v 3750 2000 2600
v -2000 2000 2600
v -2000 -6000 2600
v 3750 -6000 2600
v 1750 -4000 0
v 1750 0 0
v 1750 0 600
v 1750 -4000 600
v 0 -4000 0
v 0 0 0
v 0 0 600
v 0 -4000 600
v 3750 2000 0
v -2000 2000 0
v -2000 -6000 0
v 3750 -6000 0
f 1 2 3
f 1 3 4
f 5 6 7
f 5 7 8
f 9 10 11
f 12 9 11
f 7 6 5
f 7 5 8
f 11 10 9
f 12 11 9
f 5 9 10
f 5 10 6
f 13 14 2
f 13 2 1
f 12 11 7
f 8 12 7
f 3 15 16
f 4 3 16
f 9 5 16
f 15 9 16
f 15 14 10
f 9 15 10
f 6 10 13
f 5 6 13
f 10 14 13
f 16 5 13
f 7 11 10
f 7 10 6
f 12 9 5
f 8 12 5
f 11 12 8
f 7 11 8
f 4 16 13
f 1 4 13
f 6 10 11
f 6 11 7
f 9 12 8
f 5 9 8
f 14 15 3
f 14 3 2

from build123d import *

# Parameters (mm, degrees)
F0_W     = 1750
F0_H     = 600
F1_DEPTH = 4000
F2_W     = 5750
F2_H     = 8000
F3_DEPTH = 2600
F5_W     = 1750
F5_H     = 4000
F6_DEPTH = 600


with BuildPart() as f1:
    # F0 (on Front) → F1 (new body)
    with BuildSketch(Plane.XZ):
        with Locations((875, 300)):
            Rectangle(F0_W, F0_H)
    extrude(amount=F1_DEPTH)


with BuildPart() as f3:
    # F2 (on Top) → F3 (new body)
    with BuildSketch(Plane.XY):
        with Locations((875, -2000)):
            Rectangle(F2_W, F2_H)
    extrude(amount=F3_DEPTH)

    # F4: cut F1
    add(f1.part, mode=Mode.SUBTRACT)


with BuildPart() as f6:
    # F5 (on face) → F6 (new body, through all)
    with BuildSketch(Plane(origin=(0, 0, 0), x_dir=(1, 0, 0), z_dir=(0, 0, -1))):
        with Locations((875, 2000)):
            Rectangle(F5_W, F5_H)
    extrude(amount=-F6_DEPTH)


solid = Compound([f3.part, f6.part])
